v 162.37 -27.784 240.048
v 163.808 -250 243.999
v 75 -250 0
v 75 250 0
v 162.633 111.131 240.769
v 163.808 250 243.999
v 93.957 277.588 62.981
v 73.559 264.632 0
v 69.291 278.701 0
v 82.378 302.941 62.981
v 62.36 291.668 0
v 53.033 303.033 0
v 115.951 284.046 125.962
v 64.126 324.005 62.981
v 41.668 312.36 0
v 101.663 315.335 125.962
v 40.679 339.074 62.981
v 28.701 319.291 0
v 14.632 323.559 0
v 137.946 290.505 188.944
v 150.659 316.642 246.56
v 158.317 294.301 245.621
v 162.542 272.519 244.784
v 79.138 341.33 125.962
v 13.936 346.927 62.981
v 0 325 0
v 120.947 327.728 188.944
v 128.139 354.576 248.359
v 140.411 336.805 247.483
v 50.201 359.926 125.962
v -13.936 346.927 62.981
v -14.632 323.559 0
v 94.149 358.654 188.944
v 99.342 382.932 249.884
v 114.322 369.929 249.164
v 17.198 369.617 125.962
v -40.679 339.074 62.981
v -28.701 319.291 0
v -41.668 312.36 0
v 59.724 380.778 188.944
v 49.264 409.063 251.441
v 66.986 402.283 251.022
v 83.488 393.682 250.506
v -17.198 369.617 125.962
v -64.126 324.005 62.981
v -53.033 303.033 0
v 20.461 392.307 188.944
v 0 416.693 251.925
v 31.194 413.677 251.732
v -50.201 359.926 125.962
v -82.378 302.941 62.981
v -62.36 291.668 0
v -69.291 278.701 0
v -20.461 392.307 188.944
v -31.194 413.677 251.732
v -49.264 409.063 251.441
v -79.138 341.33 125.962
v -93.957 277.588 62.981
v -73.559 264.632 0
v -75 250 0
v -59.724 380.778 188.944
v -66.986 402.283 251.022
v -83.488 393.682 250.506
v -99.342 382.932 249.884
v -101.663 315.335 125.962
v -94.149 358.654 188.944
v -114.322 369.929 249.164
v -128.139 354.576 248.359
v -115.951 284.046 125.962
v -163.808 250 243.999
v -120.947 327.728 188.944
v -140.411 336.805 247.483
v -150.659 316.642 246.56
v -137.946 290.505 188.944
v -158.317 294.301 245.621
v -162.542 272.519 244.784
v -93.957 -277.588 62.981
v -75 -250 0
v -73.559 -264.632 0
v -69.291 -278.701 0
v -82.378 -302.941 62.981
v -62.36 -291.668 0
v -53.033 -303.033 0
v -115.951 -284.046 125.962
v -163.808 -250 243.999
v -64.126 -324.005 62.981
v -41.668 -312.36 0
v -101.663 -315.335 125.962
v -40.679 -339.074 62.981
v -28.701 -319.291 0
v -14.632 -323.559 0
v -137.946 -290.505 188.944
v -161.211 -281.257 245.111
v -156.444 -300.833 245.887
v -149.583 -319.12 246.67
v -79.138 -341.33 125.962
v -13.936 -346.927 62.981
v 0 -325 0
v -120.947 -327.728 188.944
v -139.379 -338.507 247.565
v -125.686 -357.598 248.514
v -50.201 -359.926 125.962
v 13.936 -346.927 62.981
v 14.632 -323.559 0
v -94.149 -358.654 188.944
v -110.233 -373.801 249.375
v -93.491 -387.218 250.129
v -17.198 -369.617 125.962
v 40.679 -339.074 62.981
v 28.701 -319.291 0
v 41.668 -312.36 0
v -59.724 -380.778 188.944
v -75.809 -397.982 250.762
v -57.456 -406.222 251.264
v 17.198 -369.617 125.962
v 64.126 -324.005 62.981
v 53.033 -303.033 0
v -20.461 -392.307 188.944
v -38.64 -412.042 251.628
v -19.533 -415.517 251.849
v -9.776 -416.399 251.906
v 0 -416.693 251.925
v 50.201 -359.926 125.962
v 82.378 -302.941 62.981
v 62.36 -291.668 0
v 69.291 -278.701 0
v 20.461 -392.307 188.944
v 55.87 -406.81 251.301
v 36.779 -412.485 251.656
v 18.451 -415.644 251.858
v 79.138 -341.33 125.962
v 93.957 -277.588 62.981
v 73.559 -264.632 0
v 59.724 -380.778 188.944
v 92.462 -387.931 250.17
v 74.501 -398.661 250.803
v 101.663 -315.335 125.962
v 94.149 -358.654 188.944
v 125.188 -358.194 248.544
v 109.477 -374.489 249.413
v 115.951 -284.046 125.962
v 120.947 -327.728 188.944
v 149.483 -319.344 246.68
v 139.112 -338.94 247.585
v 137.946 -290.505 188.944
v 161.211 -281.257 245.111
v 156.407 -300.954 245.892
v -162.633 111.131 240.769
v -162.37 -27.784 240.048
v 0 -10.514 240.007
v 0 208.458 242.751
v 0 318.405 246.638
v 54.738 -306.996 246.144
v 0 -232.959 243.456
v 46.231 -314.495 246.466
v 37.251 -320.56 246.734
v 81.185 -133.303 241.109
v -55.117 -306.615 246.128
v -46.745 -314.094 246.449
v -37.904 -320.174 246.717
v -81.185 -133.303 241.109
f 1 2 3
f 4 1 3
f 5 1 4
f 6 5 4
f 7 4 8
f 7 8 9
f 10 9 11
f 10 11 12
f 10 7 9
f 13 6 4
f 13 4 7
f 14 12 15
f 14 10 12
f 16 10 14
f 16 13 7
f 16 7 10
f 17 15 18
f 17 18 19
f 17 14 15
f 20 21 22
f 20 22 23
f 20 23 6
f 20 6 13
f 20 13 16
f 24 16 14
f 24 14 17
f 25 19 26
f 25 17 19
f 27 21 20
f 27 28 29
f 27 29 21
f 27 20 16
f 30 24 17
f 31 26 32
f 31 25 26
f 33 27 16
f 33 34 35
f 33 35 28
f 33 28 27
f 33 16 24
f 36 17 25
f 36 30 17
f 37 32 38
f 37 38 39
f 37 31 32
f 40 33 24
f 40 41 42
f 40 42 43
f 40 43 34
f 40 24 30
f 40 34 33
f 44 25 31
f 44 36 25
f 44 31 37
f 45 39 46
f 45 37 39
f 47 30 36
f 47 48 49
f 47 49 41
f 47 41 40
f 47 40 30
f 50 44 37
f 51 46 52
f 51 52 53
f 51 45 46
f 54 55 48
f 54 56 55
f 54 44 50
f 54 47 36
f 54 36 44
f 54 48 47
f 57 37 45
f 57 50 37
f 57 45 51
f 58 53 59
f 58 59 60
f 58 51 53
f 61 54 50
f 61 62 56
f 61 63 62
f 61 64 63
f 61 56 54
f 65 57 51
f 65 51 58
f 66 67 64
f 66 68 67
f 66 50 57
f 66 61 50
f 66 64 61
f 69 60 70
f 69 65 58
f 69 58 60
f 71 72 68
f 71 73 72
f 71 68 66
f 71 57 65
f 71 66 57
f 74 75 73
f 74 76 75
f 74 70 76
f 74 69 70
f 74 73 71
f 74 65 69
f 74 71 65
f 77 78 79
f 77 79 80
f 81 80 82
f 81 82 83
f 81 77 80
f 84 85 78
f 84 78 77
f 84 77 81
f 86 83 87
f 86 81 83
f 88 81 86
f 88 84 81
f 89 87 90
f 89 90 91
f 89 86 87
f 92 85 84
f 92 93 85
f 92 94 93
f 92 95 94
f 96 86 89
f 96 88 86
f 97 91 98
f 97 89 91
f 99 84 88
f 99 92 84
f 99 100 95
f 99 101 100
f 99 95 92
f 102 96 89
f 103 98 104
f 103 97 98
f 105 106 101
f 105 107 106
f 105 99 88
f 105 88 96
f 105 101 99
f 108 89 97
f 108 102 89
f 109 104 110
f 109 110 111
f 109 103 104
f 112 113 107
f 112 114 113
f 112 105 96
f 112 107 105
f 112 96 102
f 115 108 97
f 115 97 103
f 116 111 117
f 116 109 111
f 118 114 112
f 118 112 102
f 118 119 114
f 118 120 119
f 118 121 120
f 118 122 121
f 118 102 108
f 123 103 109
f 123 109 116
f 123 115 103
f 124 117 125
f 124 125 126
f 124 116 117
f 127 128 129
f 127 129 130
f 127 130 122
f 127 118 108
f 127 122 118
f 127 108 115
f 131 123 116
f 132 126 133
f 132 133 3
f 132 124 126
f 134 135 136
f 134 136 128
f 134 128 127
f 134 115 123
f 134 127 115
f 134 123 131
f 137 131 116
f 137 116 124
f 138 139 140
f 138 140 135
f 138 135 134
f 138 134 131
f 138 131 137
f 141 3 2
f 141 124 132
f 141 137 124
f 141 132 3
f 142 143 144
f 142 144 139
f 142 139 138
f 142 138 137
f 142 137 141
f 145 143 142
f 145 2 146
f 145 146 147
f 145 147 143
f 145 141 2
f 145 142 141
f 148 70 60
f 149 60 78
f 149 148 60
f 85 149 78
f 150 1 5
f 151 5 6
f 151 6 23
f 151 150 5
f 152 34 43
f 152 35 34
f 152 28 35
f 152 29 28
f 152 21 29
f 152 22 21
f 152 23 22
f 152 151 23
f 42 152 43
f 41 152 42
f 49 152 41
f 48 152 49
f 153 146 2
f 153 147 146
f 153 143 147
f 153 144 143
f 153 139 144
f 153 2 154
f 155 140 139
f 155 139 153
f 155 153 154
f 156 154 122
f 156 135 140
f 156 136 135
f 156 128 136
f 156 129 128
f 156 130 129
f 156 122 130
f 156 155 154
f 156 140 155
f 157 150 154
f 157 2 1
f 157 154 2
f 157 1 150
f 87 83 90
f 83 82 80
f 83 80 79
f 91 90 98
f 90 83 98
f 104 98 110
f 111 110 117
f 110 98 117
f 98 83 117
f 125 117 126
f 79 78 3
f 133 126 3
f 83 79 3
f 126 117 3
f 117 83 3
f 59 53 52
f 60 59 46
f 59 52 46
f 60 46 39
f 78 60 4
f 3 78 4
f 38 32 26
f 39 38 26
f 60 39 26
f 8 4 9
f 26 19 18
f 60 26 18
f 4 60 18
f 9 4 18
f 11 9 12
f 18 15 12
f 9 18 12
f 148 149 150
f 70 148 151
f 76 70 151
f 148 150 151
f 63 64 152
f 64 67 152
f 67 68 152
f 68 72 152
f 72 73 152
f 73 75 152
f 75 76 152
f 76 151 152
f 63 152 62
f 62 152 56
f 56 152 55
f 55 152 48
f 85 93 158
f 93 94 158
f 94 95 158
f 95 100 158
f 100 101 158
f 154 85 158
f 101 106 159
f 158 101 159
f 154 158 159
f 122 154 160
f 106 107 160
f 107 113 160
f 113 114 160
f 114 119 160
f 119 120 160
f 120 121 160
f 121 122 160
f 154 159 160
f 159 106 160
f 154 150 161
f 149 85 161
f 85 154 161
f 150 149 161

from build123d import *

# Parameters (mm, degrees)
RESSALTO_EXTRUS_O1_DEPTH   = 300
RESSALTO_EXTRUS_O1_TAPER   = -20
CORTE_EXTRUS_O1_DEPTH      = 185.19107038
CORTE_EXTRUS_O1_DEPTH_BACK = 185.19107038


with BuildPart() as part:
    # Esboço1 → Ressalto-extrusão1 (new body)
    with BuildSketch(Plane.XY):
        with BuildLine():
            Line((75, -250), (75, 250))
            ThreePointArc((75, 250), (0, 325), (-75, 250))
            Line((-75, 250), (-75, -250))
            ThreePointArc((-75, -250), (0, -325), (75, -250))
        make_face()
    extrude(amount=RESSALTO_EXTRUS_O1_DEPTH, taper=RESSALTO_EXTRUS_O1_TAPER)

    # Esboço4 → Corte-extrusão1 (cut, two sides)
    with BuildSketch(Plane(origin=(0, 0, 0), x_dir=(0, 0, -1), z_dir=(1, 0, 0))) as corte_extrus_o1_sk:
        with BuildLine():
            Line((-329.933259094, 603.571428571), (-300, 803.571428571))
            Line((-300, 803.571428571), (-270.066740906, 603.571428571))
            add(Edge.make_bspline(
                [(-329.933259094, 603.571428571), (-391.958337138, 189.14894388), (-345.979168569, -447.42728801), (-300, -1084.0035199), (-254.020831431, -447.42728801), (-208.041662862, 189.14894388), (-270.066740906, 603.571428571)],
                knots=[3.663907475, 3.663907475, 3.663907475, 5.410092697, 5.410092697, 7.156277918, 7.156277918, 8.902463139, 8.902463139, 8.902463139], degree=2, weights=[1, 0.642459696, 1, 0.642459696, 1, 0.642459696, 1]))
        make_face()
    extrude(amount=CORTE_EXTRUS_O1_DEPTH, mode=Mode.SUBTRACT)
    extrude(corte_extrus_o1_sk.sketch, amount=-CORTE_EXTRUS_O1_DEPTH_BACK, mode=Mode.SUBTRACT)


solid = part.part
